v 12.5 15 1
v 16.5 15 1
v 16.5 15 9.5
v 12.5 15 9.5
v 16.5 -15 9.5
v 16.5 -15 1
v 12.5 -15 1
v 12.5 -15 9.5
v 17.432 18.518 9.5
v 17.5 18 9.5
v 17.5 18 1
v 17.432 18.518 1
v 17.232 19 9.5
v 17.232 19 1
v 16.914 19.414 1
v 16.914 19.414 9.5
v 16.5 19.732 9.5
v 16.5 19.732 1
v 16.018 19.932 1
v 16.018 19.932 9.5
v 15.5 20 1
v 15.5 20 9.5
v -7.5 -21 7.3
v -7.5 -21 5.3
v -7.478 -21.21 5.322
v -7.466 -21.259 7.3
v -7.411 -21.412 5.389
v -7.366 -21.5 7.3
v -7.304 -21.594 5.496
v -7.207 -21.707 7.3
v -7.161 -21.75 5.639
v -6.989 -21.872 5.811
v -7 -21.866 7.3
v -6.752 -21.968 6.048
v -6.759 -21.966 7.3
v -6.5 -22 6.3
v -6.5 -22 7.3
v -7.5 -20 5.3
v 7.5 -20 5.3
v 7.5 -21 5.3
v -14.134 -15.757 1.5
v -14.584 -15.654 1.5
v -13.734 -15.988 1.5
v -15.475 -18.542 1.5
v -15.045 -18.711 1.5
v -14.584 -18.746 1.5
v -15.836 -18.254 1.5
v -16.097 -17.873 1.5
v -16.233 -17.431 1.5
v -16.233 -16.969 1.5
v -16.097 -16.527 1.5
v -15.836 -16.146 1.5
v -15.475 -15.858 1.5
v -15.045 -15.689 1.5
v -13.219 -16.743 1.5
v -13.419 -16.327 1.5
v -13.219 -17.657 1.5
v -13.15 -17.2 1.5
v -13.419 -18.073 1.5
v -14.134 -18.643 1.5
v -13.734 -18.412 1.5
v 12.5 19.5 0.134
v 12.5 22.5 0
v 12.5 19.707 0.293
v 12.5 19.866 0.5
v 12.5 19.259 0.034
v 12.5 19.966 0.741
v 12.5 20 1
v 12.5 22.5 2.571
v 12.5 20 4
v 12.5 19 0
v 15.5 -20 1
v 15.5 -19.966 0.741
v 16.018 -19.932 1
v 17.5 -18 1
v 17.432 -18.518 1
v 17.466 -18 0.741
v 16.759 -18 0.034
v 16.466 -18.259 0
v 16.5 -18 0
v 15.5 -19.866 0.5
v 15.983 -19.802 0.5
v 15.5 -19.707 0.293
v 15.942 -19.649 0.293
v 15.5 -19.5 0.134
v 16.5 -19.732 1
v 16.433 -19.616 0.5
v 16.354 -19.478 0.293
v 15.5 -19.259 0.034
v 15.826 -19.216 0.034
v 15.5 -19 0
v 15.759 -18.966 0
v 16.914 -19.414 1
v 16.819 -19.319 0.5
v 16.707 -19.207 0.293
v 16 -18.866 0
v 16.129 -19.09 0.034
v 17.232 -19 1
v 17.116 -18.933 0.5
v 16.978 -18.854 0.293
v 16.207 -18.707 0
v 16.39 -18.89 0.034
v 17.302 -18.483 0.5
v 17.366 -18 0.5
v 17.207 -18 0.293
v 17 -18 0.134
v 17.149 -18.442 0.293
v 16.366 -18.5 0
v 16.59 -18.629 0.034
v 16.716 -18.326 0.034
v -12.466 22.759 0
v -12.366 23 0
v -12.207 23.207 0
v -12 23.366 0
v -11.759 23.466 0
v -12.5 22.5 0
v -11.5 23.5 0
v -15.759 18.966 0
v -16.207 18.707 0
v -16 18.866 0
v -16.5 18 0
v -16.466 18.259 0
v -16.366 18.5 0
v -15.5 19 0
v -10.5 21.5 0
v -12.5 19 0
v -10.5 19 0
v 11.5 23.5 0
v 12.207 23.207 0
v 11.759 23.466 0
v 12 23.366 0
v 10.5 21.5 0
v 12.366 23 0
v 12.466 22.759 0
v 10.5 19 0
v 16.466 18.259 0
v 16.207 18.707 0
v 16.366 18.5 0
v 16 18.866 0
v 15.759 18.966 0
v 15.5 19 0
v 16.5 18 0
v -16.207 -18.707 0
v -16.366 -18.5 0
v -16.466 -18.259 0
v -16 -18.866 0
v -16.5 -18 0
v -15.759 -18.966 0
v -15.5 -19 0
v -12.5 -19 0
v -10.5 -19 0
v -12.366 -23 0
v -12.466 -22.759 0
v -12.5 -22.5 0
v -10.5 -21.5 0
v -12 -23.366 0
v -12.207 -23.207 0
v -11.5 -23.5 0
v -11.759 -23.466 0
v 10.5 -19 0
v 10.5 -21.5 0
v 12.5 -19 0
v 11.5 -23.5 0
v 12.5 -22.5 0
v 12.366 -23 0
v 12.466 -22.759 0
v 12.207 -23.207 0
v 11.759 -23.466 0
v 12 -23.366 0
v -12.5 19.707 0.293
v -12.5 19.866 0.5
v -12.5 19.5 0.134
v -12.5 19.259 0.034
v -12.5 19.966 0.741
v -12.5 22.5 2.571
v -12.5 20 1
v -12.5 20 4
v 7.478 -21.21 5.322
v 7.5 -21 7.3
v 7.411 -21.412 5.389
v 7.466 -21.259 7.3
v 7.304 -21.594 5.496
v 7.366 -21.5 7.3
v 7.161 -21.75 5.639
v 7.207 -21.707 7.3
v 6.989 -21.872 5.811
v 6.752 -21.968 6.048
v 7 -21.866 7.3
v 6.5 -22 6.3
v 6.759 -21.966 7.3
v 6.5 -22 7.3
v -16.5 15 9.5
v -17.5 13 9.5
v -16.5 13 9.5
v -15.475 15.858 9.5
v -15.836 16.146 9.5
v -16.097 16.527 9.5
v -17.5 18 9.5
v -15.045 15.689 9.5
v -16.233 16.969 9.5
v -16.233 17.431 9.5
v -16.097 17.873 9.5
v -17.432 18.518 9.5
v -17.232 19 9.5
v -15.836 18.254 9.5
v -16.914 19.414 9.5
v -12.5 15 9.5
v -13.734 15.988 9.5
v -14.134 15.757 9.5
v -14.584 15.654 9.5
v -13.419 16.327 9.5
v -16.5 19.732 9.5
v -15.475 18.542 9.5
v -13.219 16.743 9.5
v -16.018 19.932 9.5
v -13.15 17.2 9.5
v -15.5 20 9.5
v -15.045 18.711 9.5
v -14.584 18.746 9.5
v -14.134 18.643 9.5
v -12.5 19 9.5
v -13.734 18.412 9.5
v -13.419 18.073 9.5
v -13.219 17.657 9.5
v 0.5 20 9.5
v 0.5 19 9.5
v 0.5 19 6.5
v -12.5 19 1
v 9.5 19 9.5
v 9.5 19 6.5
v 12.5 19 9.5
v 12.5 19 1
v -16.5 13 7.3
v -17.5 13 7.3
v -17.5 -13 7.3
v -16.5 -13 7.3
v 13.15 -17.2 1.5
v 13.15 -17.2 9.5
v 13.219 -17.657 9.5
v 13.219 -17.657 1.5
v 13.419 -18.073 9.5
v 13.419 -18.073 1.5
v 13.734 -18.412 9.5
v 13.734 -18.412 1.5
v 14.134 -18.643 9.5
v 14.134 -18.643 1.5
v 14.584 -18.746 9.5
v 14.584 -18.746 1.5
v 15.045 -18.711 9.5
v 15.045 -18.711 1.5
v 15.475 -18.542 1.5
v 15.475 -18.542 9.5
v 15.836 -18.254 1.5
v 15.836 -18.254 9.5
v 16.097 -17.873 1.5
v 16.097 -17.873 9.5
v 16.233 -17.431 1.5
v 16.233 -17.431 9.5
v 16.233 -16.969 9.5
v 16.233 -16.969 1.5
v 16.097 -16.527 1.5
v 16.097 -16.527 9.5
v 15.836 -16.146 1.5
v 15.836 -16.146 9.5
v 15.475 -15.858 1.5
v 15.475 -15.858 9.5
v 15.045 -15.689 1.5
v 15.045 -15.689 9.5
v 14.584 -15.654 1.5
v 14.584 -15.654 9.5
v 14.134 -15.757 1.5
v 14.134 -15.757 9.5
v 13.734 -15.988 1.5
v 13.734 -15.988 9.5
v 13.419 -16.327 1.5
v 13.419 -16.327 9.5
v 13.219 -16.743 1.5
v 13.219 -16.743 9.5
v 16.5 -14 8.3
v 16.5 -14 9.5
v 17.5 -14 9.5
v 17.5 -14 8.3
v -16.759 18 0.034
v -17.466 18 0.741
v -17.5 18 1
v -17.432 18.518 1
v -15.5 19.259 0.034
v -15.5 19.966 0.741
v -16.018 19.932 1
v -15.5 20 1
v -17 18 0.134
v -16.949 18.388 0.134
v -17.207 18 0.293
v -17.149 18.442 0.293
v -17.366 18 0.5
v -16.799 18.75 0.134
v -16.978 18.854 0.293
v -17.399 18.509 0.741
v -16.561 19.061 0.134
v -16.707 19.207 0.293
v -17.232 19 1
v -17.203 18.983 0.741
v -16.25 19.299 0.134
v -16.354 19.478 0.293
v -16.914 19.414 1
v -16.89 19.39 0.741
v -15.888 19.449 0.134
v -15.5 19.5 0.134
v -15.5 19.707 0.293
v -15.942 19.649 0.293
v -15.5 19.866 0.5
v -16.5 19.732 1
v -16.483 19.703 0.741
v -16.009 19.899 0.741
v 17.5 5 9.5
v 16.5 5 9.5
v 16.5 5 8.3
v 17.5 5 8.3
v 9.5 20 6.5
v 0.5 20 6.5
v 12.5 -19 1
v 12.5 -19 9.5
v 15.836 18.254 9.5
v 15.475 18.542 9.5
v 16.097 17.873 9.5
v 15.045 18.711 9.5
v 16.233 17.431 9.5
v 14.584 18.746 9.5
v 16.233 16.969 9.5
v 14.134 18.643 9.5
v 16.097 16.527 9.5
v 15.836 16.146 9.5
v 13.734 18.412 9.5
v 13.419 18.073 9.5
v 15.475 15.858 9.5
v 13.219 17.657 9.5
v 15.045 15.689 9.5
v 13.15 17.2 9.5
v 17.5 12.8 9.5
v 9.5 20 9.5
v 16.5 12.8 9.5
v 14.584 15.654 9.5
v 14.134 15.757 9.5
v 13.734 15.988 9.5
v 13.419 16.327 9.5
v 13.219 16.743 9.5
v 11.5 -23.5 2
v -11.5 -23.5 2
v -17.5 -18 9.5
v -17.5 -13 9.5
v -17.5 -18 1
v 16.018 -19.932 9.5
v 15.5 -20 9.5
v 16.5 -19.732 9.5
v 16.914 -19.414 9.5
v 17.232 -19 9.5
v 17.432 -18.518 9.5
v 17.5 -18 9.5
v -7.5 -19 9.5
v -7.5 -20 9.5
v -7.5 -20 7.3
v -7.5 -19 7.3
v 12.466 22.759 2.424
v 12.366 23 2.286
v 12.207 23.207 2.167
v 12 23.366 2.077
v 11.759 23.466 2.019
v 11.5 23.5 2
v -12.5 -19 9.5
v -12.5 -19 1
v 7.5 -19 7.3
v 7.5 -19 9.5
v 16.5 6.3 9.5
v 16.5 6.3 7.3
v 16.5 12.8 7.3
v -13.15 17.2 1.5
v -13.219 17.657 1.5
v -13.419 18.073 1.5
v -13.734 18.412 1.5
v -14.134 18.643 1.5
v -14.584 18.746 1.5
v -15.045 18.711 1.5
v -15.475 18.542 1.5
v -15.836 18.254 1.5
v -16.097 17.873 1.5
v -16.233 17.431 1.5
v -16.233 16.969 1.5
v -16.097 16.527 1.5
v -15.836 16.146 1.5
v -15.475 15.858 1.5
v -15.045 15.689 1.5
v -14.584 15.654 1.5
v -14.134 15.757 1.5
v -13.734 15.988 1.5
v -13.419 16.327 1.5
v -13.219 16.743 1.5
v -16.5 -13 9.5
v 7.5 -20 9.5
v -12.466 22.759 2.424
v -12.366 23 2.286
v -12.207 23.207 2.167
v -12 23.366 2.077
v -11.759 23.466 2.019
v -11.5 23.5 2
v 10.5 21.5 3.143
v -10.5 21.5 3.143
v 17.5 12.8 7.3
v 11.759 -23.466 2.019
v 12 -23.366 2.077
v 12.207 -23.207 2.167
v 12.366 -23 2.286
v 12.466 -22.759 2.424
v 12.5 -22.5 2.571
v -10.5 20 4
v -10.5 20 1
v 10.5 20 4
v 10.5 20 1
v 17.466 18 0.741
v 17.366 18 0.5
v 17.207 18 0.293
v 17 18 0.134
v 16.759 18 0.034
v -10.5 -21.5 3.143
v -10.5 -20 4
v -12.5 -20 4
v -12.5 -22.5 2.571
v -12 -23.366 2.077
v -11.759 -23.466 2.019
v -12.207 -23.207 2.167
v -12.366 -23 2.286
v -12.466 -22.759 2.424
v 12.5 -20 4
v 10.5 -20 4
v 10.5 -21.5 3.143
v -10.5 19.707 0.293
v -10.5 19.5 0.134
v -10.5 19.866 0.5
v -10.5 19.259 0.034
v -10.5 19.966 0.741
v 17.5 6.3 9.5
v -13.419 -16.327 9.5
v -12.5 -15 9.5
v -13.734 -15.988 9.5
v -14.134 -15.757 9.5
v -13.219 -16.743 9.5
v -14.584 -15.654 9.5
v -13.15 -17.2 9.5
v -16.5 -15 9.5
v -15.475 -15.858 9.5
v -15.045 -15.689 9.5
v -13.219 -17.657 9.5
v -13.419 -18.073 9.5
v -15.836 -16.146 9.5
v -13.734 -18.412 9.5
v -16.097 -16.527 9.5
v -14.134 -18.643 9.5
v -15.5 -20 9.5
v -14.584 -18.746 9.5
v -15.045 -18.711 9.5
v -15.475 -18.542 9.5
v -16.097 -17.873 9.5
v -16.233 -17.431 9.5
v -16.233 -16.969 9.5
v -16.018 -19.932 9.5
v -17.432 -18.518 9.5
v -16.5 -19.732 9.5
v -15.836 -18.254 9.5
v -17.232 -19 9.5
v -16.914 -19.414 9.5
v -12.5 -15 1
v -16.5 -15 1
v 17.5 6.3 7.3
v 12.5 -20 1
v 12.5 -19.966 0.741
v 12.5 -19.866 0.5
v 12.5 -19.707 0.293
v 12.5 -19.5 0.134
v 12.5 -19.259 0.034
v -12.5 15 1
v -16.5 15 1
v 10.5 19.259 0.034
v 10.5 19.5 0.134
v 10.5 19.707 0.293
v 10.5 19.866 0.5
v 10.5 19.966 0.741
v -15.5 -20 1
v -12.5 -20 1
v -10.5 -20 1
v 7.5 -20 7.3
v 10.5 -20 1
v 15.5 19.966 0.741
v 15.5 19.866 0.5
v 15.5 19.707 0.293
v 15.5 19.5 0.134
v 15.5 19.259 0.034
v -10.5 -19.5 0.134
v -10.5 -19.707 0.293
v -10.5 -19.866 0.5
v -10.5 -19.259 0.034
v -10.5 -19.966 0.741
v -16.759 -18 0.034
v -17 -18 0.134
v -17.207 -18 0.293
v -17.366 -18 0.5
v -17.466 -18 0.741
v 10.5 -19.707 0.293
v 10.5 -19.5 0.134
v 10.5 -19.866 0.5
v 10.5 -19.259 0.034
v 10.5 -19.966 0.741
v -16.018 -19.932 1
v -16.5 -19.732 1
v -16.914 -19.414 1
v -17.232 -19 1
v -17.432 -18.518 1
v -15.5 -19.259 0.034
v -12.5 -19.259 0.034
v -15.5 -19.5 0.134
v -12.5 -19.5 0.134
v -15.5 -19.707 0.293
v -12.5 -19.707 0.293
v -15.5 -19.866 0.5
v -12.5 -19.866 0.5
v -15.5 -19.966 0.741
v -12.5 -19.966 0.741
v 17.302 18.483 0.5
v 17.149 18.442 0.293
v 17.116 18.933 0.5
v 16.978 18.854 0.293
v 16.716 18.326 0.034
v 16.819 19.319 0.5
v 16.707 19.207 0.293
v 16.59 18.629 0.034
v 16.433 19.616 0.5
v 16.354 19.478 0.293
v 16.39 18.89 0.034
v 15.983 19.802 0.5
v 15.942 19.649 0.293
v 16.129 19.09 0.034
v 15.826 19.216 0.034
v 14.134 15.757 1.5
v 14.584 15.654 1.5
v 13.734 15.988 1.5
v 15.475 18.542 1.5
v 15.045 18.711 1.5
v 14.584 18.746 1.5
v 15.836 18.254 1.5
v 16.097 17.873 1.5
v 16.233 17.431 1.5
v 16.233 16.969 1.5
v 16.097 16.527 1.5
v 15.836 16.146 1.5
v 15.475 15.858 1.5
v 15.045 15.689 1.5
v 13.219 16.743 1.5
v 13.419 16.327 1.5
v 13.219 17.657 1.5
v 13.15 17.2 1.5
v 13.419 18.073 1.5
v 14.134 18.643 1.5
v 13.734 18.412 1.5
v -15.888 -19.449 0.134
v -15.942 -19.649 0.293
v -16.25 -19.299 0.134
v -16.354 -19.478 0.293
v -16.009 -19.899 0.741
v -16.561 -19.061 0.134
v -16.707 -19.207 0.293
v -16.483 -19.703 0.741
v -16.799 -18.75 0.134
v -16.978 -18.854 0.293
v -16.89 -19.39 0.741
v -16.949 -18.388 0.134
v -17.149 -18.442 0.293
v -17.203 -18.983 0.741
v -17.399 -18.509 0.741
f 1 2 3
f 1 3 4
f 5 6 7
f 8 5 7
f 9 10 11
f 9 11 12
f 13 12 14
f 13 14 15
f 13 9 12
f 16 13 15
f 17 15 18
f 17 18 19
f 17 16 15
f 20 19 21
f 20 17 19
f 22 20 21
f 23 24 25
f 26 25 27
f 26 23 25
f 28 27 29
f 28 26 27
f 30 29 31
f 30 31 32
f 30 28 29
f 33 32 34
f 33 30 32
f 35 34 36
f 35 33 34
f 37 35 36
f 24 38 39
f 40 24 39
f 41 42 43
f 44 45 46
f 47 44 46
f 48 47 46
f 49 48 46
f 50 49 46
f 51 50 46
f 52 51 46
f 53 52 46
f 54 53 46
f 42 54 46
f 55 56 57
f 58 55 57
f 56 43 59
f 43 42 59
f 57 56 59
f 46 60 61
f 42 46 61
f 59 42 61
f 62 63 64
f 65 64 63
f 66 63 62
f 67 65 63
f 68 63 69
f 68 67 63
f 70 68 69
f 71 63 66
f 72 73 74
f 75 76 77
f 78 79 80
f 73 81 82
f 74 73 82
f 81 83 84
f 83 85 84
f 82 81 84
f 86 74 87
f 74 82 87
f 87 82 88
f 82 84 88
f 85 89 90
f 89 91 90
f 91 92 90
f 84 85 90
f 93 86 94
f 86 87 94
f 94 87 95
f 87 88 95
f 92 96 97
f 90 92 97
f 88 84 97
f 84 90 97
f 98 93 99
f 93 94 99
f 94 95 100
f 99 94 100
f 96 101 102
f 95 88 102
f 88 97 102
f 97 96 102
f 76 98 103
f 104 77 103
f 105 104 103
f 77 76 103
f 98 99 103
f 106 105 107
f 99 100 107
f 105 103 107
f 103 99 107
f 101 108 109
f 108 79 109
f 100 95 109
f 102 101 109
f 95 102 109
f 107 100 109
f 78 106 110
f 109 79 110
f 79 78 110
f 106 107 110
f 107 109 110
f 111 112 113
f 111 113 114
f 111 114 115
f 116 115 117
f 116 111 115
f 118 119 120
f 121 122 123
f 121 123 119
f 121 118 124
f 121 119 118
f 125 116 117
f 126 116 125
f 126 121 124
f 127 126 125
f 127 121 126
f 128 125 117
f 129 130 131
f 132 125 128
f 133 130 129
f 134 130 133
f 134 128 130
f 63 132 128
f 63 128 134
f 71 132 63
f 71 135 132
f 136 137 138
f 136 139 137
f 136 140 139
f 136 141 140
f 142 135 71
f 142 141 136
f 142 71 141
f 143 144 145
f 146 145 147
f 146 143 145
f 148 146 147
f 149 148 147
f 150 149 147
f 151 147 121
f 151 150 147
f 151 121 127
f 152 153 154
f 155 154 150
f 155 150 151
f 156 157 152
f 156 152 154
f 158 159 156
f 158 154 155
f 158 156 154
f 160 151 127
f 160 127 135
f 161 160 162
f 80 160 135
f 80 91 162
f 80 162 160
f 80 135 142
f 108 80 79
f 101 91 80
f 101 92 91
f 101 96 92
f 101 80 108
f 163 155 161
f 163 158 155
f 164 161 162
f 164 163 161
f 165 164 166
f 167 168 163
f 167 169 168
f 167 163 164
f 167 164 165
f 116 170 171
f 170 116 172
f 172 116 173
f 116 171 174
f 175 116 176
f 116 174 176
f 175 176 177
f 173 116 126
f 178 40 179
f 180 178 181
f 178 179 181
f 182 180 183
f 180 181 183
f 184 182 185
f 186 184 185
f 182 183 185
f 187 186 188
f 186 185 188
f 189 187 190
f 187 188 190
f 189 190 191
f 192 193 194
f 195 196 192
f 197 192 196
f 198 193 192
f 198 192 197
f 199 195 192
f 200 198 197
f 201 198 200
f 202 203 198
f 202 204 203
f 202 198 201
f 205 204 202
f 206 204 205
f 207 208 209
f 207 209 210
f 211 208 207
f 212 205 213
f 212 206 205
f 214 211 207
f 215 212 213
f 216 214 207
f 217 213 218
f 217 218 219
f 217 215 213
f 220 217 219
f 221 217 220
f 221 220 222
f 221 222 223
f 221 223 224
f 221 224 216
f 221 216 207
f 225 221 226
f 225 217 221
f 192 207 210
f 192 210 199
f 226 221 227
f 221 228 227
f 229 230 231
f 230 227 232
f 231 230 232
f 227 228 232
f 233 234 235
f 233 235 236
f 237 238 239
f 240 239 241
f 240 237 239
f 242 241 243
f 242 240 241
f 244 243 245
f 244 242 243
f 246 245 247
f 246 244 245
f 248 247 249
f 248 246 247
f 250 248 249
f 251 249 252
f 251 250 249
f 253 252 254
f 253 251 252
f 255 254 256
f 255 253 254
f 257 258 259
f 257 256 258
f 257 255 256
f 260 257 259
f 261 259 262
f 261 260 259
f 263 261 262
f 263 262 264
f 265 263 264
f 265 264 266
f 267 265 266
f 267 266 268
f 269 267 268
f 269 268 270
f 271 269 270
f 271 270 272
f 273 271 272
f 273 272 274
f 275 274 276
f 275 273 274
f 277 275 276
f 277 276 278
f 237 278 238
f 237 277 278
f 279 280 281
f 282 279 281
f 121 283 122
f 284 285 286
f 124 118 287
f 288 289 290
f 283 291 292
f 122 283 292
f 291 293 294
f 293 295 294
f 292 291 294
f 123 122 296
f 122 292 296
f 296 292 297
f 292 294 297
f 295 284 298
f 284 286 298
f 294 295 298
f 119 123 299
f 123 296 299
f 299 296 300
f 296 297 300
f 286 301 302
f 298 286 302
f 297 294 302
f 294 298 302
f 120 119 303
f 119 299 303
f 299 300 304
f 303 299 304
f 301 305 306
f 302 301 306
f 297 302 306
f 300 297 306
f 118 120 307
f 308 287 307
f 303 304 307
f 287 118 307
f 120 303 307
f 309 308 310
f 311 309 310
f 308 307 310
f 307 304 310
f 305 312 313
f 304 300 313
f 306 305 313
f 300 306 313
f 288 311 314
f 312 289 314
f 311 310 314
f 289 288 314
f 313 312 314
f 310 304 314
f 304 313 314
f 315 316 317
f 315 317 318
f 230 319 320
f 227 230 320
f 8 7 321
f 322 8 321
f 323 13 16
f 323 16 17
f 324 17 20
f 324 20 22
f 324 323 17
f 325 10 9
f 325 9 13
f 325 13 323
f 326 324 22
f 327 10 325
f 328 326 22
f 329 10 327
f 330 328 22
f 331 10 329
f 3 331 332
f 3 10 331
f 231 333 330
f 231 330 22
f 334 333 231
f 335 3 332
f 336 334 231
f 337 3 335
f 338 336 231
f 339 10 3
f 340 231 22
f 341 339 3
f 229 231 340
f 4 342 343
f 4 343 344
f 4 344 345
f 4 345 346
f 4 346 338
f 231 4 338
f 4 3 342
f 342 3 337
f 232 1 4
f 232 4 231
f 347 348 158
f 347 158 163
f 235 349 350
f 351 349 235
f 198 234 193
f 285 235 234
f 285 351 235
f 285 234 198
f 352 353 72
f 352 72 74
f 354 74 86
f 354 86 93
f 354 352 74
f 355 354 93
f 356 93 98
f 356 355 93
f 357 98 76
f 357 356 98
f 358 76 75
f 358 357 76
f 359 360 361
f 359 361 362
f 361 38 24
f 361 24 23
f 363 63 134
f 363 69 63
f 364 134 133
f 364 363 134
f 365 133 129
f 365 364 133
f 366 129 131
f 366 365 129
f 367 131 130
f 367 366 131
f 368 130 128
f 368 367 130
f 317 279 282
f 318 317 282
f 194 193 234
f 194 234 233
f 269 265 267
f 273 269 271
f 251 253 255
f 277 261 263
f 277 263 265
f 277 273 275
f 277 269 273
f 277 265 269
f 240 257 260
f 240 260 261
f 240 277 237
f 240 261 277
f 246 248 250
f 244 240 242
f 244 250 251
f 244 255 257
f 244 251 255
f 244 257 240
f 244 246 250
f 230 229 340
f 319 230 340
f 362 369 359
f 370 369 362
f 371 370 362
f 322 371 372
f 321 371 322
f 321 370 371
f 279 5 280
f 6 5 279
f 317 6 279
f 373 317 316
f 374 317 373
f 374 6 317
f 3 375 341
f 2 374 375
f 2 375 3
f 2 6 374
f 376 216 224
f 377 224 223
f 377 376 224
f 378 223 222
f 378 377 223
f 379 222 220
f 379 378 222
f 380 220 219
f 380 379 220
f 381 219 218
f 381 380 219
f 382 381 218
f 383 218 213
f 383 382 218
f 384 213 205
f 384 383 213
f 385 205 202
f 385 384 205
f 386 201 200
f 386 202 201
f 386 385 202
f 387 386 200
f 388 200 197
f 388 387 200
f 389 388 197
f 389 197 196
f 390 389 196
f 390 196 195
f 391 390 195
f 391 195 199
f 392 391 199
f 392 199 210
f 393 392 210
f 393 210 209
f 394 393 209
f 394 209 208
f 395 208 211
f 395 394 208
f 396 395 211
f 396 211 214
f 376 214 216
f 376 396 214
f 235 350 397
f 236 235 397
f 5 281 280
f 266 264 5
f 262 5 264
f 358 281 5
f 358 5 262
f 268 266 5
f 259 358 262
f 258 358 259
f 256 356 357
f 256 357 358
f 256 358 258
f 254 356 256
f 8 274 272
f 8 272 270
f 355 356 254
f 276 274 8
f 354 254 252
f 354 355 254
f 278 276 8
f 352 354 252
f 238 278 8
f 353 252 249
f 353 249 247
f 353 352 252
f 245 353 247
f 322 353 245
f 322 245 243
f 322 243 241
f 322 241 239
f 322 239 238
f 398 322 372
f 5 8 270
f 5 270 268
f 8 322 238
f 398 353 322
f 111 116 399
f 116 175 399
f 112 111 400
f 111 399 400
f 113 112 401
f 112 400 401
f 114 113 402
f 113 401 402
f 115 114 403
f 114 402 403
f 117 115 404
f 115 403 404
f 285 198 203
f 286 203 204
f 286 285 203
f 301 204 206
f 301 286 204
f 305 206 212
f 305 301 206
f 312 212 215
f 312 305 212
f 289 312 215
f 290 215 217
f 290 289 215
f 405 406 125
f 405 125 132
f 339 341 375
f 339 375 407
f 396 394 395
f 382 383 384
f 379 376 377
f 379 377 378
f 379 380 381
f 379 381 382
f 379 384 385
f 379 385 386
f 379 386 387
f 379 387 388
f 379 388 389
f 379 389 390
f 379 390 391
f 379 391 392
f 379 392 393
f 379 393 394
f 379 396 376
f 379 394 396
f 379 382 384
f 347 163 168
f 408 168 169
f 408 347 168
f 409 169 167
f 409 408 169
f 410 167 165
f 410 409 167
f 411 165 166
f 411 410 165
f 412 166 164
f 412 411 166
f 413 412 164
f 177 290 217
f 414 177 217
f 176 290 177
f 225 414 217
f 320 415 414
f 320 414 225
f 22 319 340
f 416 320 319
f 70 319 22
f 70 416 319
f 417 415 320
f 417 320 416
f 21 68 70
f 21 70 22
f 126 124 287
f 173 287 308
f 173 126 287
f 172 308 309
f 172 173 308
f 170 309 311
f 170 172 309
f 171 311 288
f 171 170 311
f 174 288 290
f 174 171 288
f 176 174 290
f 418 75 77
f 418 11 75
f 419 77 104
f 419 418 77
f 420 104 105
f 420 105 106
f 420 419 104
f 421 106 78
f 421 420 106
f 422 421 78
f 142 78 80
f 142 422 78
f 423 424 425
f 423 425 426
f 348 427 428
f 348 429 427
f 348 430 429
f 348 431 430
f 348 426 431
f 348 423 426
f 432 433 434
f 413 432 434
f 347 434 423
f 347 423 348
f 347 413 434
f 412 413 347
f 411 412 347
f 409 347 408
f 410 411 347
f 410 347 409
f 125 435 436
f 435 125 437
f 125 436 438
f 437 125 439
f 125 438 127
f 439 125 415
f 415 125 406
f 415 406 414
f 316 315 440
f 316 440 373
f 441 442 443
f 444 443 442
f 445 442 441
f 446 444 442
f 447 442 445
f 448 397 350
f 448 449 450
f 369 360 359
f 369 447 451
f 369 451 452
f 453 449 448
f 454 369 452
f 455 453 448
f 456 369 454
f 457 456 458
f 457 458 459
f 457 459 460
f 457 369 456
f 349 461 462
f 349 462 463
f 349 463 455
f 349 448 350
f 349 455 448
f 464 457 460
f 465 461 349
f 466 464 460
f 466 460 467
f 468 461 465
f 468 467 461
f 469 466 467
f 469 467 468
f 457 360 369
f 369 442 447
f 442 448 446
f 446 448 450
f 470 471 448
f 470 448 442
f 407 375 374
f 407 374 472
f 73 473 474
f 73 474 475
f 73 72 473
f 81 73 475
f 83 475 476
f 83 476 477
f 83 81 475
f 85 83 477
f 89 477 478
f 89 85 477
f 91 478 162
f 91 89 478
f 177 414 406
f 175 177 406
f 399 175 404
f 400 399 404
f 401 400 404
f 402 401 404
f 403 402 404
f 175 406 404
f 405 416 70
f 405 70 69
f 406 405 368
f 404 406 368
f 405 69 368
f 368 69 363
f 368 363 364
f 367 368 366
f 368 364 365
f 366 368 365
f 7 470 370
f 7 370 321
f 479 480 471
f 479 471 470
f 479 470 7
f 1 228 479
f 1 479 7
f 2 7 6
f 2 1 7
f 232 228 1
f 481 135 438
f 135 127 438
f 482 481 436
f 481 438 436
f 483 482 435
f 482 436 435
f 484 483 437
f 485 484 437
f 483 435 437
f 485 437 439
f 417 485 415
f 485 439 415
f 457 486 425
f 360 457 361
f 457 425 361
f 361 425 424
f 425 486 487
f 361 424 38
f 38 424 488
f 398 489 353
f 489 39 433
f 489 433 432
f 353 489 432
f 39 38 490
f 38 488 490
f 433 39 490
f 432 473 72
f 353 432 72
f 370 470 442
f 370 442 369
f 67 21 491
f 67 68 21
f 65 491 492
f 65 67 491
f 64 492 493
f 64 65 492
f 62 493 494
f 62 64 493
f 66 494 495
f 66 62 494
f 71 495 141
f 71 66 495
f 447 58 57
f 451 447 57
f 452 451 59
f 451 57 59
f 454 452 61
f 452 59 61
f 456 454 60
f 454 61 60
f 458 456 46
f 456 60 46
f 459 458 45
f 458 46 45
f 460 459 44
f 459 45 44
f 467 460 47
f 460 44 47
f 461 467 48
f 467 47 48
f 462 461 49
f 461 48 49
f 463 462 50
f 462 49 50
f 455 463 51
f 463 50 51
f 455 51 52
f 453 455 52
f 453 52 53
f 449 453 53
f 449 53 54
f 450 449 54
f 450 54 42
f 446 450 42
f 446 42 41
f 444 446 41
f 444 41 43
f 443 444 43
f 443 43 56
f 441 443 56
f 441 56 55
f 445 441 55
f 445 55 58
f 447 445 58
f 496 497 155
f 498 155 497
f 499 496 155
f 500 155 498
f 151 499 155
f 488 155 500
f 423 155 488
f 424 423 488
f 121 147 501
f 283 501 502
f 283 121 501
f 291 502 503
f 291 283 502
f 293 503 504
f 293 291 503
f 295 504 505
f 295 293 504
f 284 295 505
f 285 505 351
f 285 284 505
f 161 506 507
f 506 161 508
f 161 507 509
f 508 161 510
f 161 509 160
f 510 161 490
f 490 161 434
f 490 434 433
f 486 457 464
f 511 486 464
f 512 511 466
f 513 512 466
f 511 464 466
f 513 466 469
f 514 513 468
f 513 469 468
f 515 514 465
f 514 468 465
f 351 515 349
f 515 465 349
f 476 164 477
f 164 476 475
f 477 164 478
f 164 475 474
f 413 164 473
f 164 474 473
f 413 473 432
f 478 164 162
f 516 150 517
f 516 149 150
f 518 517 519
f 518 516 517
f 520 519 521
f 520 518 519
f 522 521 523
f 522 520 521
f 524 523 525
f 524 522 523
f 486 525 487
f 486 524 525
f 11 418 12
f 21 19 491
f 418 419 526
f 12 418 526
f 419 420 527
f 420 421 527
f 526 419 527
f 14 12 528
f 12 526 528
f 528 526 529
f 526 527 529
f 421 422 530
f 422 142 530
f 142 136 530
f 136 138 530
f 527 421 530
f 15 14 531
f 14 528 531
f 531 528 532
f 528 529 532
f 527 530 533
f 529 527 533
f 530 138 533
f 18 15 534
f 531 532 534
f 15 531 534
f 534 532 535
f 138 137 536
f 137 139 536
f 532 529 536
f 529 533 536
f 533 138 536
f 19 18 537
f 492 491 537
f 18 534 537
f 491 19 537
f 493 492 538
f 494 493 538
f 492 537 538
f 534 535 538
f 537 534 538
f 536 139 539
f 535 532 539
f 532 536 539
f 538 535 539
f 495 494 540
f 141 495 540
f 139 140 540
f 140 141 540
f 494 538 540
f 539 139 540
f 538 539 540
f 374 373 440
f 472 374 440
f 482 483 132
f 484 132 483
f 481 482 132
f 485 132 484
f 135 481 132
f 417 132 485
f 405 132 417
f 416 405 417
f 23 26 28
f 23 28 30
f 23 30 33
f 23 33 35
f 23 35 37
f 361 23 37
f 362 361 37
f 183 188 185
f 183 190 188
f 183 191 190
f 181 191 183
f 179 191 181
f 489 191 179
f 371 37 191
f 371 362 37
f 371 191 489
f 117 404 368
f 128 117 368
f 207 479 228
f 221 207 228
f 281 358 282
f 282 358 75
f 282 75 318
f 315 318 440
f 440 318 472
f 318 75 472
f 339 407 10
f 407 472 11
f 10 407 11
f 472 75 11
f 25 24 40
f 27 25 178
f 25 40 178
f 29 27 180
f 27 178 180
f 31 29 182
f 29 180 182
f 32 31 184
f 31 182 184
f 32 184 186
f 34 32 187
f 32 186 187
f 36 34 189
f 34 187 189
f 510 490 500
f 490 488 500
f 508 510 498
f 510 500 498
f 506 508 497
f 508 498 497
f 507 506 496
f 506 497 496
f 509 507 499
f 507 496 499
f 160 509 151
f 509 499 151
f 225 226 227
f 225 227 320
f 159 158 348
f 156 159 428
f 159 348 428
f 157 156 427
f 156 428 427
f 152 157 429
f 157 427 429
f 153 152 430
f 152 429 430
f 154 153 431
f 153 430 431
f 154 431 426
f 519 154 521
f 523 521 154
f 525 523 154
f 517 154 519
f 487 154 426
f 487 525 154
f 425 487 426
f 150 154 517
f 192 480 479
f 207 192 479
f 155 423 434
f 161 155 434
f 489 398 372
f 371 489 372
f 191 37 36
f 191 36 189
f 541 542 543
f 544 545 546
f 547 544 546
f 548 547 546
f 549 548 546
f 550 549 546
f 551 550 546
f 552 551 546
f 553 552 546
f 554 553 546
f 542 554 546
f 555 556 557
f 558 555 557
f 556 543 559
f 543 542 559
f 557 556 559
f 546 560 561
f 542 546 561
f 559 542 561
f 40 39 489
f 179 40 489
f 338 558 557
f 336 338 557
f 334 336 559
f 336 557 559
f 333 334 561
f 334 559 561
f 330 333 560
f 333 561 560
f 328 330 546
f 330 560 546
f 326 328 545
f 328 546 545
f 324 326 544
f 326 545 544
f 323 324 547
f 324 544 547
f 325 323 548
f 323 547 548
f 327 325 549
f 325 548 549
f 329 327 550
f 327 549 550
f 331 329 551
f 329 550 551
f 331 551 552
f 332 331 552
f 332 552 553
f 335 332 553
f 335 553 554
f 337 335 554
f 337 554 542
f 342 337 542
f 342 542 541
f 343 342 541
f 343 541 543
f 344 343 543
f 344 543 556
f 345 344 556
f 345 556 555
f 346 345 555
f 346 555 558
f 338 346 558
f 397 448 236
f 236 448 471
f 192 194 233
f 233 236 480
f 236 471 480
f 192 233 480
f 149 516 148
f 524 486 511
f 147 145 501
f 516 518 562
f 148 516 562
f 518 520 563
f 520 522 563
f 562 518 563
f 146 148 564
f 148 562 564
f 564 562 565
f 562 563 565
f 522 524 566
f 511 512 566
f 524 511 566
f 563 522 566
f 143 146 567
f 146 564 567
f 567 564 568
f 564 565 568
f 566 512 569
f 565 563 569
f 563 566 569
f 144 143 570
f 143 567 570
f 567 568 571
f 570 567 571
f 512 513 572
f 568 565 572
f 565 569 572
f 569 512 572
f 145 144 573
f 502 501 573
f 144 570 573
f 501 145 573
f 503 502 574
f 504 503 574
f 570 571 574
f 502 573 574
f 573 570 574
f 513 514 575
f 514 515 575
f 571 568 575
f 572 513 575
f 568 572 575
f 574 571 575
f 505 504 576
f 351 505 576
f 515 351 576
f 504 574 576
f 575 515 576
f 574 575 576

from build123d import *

# Parameters (mm, degrees)
SKETCH_1_W               = 35
SKETCH_1_H               = 40
EXTRUDE_1_DEPTH          = 9.5
SHELL_1_T                = -1
SKETCH_2_W               = 4
SKETCH_2_H               = 4
EXTRUDE_2_DEPTH          = 8.5
MIRROR_4_COPY_1_SKETCH_W = 4
MIRROR_4_COPY_1_SKETCH_H = 4
MIRROR_4_COPY_1_DEPTH    = 8.5
SKETCH_3_R               = 1.55
CUT_EXTRUDE_1_DEPTH      = 12
MIRROR_6_COPY_1_SKETCH_R = 1.55
MIRROR_6_COPY_1_DEPTH    = 12
SKETCH_6_R               = 1.55
EXTRUDE_3_DEPTH          = 1.5
MIRROR_8_COPY_1_SKETCH_R = 1.55
MIRROR_8_COPY_1_DEPTH    = 1.5
SKETCH_7_W               = 9
SKETCH_7_H               = 1
CUT_EXTRUDE_2_DEPTH      = 3
SKETCH_8_W               = 1
SKETCH_8_H               = 26
CUT_EXTRUDE_3_DEPTH      = 2.2
SKETCH_9_W               = 1
SKETCH_9_H               = 19
CUT_EXTRUDE_4_DEPTH      = 1.2
SKETCH_10_W              = 1
SKETCH_10_H              = 6.5
CUT_EXTRUDE_5_DEPTH      = 2.2
SKETCH_11_W              = 15
SKETCH_11_H              = 1
CUT_EXTRUDE_6_DEPTH      = 2.2
SKETCH_12_W              = 25
SKETCH_12_H              = 4
EXTRUDE_4_DEPTH          = 3.5
SKETCH_13_W              = 21
SKETCH_13_H              = 1.5
CUT_EXTRUDE_7_DEPTH      = 5
CUT_EXTRUDE_8_DEPTH      = 50
SKETCH_15_W              = 15
SKETCH_15_H              = 2
EXTRUDE_5_DEPTH          = 2
FILLET_1_R               = 2
FILLET_2_R               = 1
FILLET_3_R               = 1
FILLET_4_R               = 1
SKETCH_16_W              = 9
SKETCH_16_H              = 1
EXTRUDE_6_DEPTH          = 3


with BuildPart() as part:
    # 草图1 → 凸台-拉伸1 (new body)
    with BuildSketch(Plane.XY):
        Rectangle(SKETCH_1_W, SKETCH_1_H)
    extrude(amount=EXTRUDE_1_DEPTH)

    # 抽壳1
    shell_1_openings = [part.faces().sort_by_distance(p)[0] for p in [
        (0, 0, 9.5),
    ]]
    offset(amount=SHELL_1_T, openings=shell_1_openings, kind=Kind.INTERSECTION)

    # 草图2 → 凸台-拉伸2 (add)
    with BuildSketch(Plane.XY.offset(1)):
        with Locations((-14.5, 17)):
            Rectangle(SKETCH_2_W, SKETCH_2_H)
    extrude_2 = extrude(amount=EXTRUDE_2_DEPTH)

    # 镜向3: 凸台-拉伸2 across plane
    add(extrude_2.mirror(Plane.ZX))

    # 镜向4: 凸台-拉伸2 across plane
    add(extrude_2.mirror(Plane(origin=(0, 0, 0), x_dir=(0, 0, 1), z_dir=(1, 0, 0))))

    # 镜向4 copy 1 sketch → 镜向4 copy 1 (add)
    with BuildSketch(Plane(origin=(0, 0, 1), x_dir=(-1, 0, 0), z_dir=(0, 0, 1))):
        with Locations((-14.5, 17)):
            Rectangle(MIRROR_4_COPY_1_SKETCH_W, MIRROR_4_COPY_1_SKETCH_H)
    extrude(amount=MIRROR_4_COPY_1_DEPTH)

    # 草图3 → 切除-拉伸1 (cut)
    with BuildSketch(Plane(origin=(0, 0, 0), x_dir=(-1, 0, 0), z_dir=(0, 0, -1))):
        with Locations((-14.7, 17.2)):
            Circle(SKETCH_3_R)
    cut_extrude_1 = extrude(amount=-CUT_EXTRUDE_1_DEPTH, mode=Mode.SUBTRACT)

    # 镜向5: 切除-拉伸1 across plane
    add(cut_extrude_1.mirror(Plane.ZX), mode=Mode.SUBTRACT)

    # 镜向6: 切除-拉伸1 across plane
    add(cut_extrude_1.mirror(Plane(origin=(0, 0, 0), x_dir=(0, 0, 1), z_dir=(1, 0, 0))), mode=Mode.SUBTRACT)

    # 镜向6 copy 1 sketch → 镜向6 copy 1 (cut)
    with BuildSketch(Plane(origin=(0, 0, 0), x_dir=(1, 0, 0), z_dir=(0, 0, -1))):
        with Locations((-14.7, 17.2)):
            Circle(MIRROR_6_COPY_1_SKETCH_R)
    extrude(amount=-MIRROR_6_COPY_1_DEPTH, mode=Mode.SUBTRACT)

    # 草图6 → 凸台-拉伸3 (add)
    with BuildSketch(Plane(origin=(0, 0, 0), x_dir=(-1, 0, 0), z_dir=(0, 0, -1))):
        with Locations((-14.7, 17.2)):
            Circle(SKETCH_6_R)
    extrude_3 = extrude(amount=-EXTRUDE_3_DEPTH)

    # 镜向7: 凸台-拉伸3 across plane
    add(extrude_3.mirror(Plane.ZX))

    # 镜向8: 凸台-拉伸3 across plane
    add(extrude_3.mirror(Plane(origin=(0, 0, 0), x_dir=(0, 0, 1), z_dir=(1, 0, 0))))

    # 镜向8 copy 1 sketch → 镜向8 copy 1 (add)
    with BuildSketch(Plane(origin=(0, 0, 0), x_dir=(1, 0, 0), z_dir=(0, 0, -1))):
        with Locations((-14.7, 17.2)):
            Circle(MIRROR_8_COPY_1_SKETCH_R)
    extrude(amount=-MIRROR_8_COPY_1_DEPTH)

    # 草图7 → 切除-拉伸2 (cut)
    with BuildSketch(Plane.XY.offset(9.5)):
        with Locations((-5, 19.5)):
            Rectangle(SKETCH_7_W, SKETCH_7_H)
    cut_extrude_2 = extrude(amount=-CUT_EXTRUDE_2_DEPTH, mode=Mode.SUBTRACT)

    # 草图8 → 切除-拉伸3 (cut)
    with BuildSketch(Plane.XY.offset(9.5)):
        with Locations((-17, 0)):
            Rectangle(SKETCH_8_W, SKETCH_8_H)
    extrude(amount=-CUT_EXTRUDE_3_DEPTH, mode=Mode.SUBTRACT)

    # 草图9 → 切除-拉伸4 (cut)
    with BuildSketch(Plane.XY.offset(9.5)):
        with Locations((17, -4.5)):
            Rectangle(SKETCH_9_W, SKETCH_9_H)
    extrude(amount=-CUT_EXTRUDE_4_DEPTH, mode=Mode.SUBTRACT)

    # 草图10 → 切除-拉伸5 (cut)
    with BuildSketch(Plane.XY.offset(9.5)):
        with Locations((17, 9.55)):
            Rectangle(SKETCH_10_W, SKETCH_10_H)
    extrude(amount=-CUT_EXTRUDE_5_DEPTH, mode=Mode.SUBTRACT)

    # 草图11 → 切除-拉伸6 (cut)
    with BuildSketch(Plane.XY.offset(9.5)):
        with Locations((0, -19.5)):
            Rectangle(SKETCH_11_W, SKETCH_11_H)
    extrude(amount=-CUT_EXTRUDE_6_DEPTH, mode=Mode.SUBTRACT)

    # 草图12 → 凸台-拉伸4 (add)
    with BuildSketch(Plane.XZ.offset(20)):
        with Locations((0, 2)):
            Rectangle(SKETCH_12_W, SKETCH_12_H)
    extrude_4 = extrude(amount=EXTRUDE_4_DEPTH)

    # 草图13 → 切除-拉伸7 (cut)
    with BuildSketch(Plane.XY.offset(4)):
        with Locations((0, -20.75)):
            Rectangle(SKETCH_13_W, SKETCH_13_H)
    cut_extrude_7 = extrude(amount=-CUT_EXTRUDE_7_DEPTH, mode=Mode.SUBTRACT)

    # 草图14 → 切除-拉伸8 (cut)
    with BuildSketch(Plane(origin=(12.5, 0, 0), x_dir=(0, 0, -1), z_dir=(1, 0, 0))):
        Polygon((-2, -23.5), (-4, -23.5), (-4, -21.75), (-4, -20), align=None)
    cut_extrude_8 = extrude(amount=-CUT_EXTRUDE_8_DEPTH, mode=Mode.SUBTRACT)

    # 镜向11: 凸台-拉伸4, 切除-拉伸7, 切除-拉伸8 across plane
    add(extrude_4.mirror(Plane.ZX))
    add(cut_extrude_7.mirror(Plane.ZX), mode=Mode.SUBTRACT)
    add(cut_extrude_8.mirror(Plane.ZX), mode=Mode.SUBTRACT)

    # 草图15 → 凸台-拉伸5 (add)
    with BuildSketch(Plane.XZ.offset(20)):
        with Locations((0, 6.3)):
            Rectangle(SKETCH_15_W, SKETCH_15_H)
    extrude(amount=EXTRUDE_5_DEPTH)

    # 圆角1
    fillet_1_edges = [part.edges().sort_by_distance(p)[0] for p in [
        (-17.5, 20, 4.75),
        (17.5, 20, 4.75),
        (17.5, -20, 4.75),
        (-17.5, -20, 4.75),
    ]]
    fillet(fillet_1_edges, radius=FILLET_1_R)

    # 圆角2
    fillet_2_edges = [part.edges().sort_by_distance(p)[0] for p in [
        (14, -20, 0),
        (0, -20, 0),
        (-14, 20, 0),
        (0, 20, 0),
        (-17.5, 0, 0),
        (14, 20, 0),
        (17.5, 0, 0),
        (-14, -20, 0),
        (-16.914213562, -19.414213562, 0),
        (16.914213562, -19.414213562, 0),
        (16.914213562, 19.414213562, 0),
        (-16.914213562, 19.414213562, 0),
    ]]
    fillet(fillet_2_edges, radius=FILLET_2_R)

    # 圆角3
    fillet_3_edges = [part.edges().sort_by_distance(p)[0] for p in [
        (12.5, -23.5, 1),
        (-12.5, -23.5, 1),
        (12.5, 23.5, 1),
        (-12.5, 23.5, 1),
    ]]
    fillet(fillet_3_edges, radius=FILLET_3_R)

    # 圆角4
    fillet_4_edges = [part.edges().sort_by_distance(p)[0] for p in [
        (-7.5, -22, 6.3),
        (0, -22, 5.3),
        (7.5, -22, 6.3),
    ]]
    fillet(fillet_4_edges, radius=FILLET_4_R)

    # 镜向12: 切除-拉伸2 across plane
    add(cut_extrude_2.mirror(Plane(origin=(0, 0, 0), x_dir=(0, 0, 1), z_dir=(1, 0, 0))), mode=Mode.SUBTRACT)

    # 草图16 → 凸台-拉伸6 (add)
    with BuildSketch(Plane.XY.offset(6.5)):
        with Locations((-5, 19.5)):
            Rectangle(SKETCH_16_W, SKETCH_16_H)
    extrude(amount=EXTRUDE_6_DEPTH)


solid = part.part
